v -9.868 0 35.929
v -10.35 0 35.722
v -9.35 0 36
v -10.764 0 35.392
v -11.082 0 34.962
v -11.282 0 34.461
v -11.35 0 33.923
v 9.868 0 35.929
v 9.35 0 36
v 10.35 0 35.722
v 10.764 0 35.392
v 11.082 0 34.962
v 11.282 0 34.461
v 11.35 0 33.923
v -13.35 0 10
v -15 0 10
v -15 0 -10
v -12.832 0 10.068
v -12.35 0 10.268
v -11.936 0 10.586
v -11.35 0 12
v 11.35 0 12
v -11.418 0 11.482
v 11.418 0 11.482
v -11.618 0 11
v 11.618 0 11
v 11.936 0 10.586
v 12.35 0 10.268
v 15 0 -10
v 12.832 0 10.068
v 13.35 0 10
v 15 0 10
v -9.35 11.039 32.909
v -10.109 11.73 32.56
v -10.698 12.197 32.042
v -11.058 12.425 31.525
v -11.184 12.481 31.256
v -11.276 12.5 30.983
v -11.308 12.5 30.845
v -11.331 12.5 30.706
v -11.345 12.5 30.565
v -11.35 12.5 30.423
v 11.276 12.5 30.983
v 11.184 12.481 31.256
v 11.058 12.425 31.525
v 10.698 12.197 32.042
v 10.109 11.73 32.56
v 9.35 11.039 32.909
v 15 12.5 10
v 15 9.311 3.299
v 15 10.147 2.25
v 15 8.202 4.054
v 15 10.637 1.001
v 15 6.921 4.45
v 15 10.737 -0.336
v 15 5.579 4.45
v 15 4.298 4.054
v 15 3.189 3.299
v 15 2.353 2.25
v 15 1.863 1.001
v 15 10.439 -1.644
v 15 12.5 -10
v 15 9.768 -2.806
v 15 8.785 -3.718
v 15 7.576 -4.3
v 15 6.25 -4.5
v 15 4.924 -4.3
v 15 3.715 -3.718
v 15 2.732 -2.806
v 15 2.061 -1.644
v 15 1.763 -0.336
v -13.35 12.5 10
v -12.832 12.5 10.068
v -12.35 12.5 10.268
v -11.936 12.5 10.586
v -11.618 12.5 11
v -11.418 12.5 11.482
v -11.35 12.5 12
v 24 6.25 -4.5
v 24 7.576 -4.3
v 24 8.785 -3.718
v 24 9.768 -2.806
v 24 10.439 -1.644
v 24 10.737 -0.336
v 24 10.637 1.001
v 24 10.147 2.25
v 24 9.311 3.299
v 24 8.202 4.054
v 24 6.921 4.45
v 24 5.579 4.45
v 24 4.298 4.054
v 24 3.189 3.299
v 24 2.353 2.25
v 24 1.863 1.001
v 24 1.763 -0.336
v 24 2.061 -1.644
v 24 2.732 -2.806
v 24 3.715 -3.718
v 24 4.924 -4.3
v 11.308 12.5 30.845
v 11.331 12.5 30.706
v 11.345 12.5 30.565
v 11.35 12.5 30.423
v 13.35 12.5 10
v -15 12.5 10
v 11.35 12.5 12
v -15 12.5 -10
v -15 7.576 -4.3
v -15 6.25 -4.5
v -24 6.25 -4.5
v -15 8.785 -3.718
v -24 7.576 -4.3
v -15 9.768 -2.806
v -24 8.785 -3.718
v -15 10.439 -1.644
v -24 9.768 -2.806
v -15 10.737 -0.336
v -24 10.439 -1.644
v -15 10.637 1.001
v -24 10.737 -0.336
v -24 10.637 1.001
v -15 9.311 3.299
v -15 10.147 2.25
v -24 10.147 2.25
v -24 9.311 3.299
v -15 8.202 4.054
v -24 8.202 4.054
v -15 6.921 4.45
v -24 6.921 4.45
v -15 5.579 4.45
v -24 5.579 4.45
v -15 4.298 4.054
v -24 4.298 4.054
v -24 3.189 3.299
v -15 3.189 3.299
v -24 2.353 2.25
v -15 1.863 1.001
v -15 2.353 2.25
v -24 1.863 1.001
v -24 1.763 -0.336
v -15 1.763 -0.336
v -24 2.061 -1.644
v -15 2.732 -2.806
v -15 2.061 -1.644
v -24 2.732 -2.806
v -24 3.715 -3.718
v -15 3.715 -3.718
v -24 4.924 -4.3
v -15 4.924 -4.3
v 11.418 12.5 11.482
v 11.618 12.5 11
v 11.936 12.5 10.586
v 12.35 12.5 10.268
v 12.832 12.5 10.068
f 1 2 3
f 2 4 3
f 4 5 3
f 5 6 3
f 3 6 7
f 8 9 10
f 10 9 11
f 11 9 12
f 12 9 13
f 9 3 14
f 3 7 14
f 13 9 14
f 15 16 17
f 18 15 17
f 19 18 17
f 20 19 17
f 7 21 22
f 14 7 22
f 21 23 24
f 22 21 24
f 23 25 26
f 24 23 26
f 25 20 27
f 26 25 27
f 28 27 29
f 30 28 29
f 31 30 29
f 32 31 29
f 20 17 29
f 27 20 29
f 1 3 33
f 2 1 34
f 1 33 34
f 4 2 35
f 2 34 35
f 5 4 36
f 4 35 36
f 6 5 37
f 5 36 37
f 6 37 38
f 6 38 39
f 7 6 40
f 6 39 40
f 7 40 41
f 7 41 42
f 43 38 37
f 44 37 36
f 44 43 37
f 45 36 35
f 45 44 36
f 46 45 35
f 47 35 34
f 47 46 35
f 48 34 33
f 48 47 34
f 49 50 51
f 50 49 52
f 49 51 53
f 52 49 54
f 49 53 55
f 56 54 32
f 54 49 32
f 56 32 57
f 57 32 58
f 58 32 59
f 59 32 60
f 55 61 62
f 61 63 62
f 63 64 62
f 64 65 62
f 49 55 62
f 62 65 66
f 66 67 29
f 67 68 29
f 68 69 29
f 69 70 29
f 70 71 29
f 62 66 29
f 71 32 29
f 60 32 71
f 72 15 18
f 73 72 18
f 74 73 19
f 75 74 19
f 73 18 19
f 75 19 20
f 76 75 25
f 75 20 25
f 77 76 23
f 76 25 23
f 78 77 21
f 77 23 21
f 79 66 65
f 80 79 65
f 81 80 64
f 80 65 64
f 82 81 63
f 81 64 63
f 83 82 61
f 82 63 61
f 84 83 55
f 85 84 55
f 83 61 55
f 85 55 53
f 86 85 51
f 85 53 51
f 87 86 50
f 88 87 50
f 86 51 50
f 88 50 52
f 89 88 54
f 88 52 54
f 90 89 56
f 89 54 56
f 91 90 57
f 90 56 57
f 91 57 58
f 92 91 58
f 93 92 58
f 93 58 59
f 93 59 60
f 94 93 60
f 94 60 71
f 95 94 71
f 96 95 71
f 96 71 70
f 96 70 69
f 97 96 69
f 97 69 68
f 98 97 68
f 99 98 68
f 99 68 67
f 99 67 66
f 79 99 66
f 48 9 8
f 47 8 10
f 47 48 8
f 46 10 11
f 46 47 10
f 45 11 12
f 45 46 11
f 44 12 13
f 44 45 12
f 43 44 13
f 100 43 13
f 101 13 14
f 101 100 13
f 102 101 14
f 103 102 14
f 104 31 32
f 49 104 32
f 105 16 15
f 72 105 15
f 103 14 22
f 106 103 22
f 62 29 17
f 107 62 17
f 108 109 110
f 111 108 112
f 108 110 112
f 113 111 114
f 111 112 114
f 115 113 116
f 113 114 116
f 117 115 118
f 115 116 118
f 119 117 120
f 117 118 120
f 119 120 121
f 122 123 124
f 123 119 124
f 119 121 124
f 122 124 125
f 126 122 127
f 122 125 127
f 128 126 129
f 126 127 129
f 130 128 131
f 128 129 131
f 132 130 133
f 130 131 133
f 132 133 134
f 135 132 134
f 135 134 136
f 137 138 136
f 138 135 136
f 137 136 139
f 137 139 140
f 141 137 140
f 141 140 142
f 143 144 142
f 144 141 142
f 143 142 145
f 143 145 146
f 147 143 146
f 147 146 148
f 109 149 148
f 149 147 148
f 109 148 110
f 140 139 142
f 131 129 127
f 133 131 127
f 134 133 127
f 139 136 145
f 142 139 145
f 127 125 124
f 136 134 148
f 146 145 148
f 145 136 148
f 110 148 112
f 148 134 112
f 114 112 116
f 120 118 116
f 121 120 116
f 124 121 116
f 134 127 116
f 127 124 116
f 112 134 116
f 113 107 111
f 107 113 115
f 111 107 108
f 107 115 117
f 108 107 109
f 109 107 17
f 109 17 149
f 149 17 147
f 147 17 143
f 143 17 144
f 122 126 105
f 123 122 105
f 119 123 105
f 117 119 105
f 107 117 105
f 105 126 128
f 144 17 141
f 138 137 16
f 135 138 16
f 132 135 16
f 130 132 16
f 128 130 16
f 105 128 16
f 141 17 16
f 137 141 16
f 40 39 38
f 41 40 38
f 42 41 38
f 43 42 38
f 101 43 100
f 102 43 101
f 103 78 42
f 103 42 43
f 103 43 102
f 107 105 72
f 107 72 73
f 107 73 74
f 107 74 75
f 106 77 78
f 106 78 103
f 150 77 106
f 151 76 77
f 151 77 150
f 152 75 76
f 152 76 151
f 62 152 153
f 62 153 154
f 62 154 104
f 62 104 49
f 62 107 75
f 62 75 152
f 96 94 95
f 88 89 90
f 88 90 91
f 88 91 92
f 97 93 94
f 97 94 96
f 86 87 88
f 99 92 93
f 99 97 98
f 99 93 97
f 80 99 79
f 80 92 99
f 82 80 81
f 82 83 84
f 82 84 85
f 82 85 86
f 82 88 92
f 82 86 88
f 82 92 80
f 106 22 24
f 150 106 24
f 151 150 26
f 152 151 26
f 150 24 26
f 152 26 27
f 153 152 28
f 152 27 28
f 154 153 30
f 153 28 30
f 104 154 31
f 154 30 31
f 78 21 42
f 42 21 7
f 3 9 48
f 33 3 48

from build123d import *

# Parameters (mm, degrees)
BOSS_EXTRUDE1_DEPTH            = 12.5
CUT_EXTRUDE1_REACH             = 42.954
CUT_EXTRUDE1_DIRECTION_2_REACH = 42.954
FILLET1_R                      = 2
BOSS_EXTRUDE2_DEPTH            = 24
BOSS_EXTRUDE2_DEPTH_BACK       = 24
SKETCH3_R                      = 4.5


with BuildPart() as part:
    # Sketch1 → Boss-Extrude1 (new body)
    with BuildSketch(Plane(origin=(0, 0, 0), x_dir=(1, 0, 0), z_dir=(0, 1, 0))):
        with BuildLine():
            Line((13.35, -10), (15, -10))
            Line((15, -10), (15, 10))
            Line((15, 10), (-15, 10))
            Line((-15, 10), (-15, -10))
            Line((-15, -10), (-13.35, -10))
            ThreePointArc((-13.35, -10), (-11.935786438, -10.585786438), (-11.35, -12))
            Line((-11.35, -12), (-11.35, -36))
            Line((-11.35, -36), (11.35, -36))
            Line((11.35, -36), (11.35, -12))
            ThreePointArc((11.35, -12), (11.935786438, -10.585786438), (13.35, -10))
        make_face()
    extrude(amount=BOSS_EXTRUDE1_DEPTH)

    # Cut-Extrude1: up to this face of the body (flat: up to its plane)
    cut_extrude1_end = Plane(part.part.faces().sort_by_distance((-11.35, 6.25, 24))[0])
    # Sketch2 → Cut-Extrude1 (cut, up to the picked face)
    with BuildSketch(Plane(origin=(0, 0, 0), x_dir=(0, 0, -1), z_dir=(1, 0, 0)), mode=Mode.PRIVATE) as cut_extrude1_sk1:
        Polygon((-36, 0), (-32.5, 12.5), (-36, 12.5), align=None)
    cut_extrude1_tool1 = split(extrude(cut_extrude1_sk1.sketch, amount=-CUT_EXTRUDE1_REACH, mode=Mode.PRIVATE), bisect_by=cut_extrude1_end, keep=Keep.BOTH, mode=Mode.PRIVATE)
    add(cut_extrude1_tool1.solids().sort_by(Axis((0, 8.333333, 34.833333), (-1, 0, 0)))[0], mode=Mode.SUBTRACT)

    # Cut-Extrude1 direction 2: up to this face of the body (flat: up to its plane)
    cut_extrude1_direction_2_end = Plane(part.part.faces().sort_by_distance((11.35, 6.25, 24))[0])
    # Sketch2 → Cut-Extrude1 direction 2 (cut, up to the picked face)
    with BuildSketch(Plane(origin=(0, 0, 0), x_dir=(0, 0, -1), z_dir=(1, 0, 0)), mode=Mode.PRIVATE) as cut_extrude1_direction_2_sk1:
        Polygon((-36, 0), (-32.5, 12.5), (-36, 12.5), align=None)
    cut_extrude1_direction_2_tool1 = split(extrude(cut_extrude1_direction_2_sk1.sketch, amount=CUT_EXTRUDE1_DIRECTION_2_REACH, mode=Mode.PRIVATE), bisect_by=cut_extrude1_direction_2_end, keep=Keep.BOTH, mode=Mode.PRIVATE)
    add(cut_extrude1_direction_2_tool1.solids().sort_by(Axis((0, 8.333333, 34.833333), (1, 0, 0)))[0], mode=Mode.SUBTRACT)

    # Fillet1
    fillet1_edges = [part.edges().sort_by_distance(p)[0] for p in [
        (0, 12.5, 32.5),
        (11.35, 6.25, 34.25),
        (-11.35, 6.25, 34.25),
    ]]
    fillet(fillet1_edges, radius=FILLET1_R)

    # Sketch3 → Boss-Extrude2 (add, two sides: drawn at the far end of the back side and taken through both)
    with BuildSketch(Plane(origin=(0, 0, 0), x_dir=(0, 0, -1), z_dir=(1, 0, 0)).offset(-BOSS_EXTRUDE2_DEPTH_BACK)):
        with Locations((0, 6.25)):
            Circle(SKETCH3_R)
    extrude(amount=BOSS_EXTRUDE2_DEPTH + BOSS_EXTRUDE2_DEPTH_BACK)


solid = part.part
